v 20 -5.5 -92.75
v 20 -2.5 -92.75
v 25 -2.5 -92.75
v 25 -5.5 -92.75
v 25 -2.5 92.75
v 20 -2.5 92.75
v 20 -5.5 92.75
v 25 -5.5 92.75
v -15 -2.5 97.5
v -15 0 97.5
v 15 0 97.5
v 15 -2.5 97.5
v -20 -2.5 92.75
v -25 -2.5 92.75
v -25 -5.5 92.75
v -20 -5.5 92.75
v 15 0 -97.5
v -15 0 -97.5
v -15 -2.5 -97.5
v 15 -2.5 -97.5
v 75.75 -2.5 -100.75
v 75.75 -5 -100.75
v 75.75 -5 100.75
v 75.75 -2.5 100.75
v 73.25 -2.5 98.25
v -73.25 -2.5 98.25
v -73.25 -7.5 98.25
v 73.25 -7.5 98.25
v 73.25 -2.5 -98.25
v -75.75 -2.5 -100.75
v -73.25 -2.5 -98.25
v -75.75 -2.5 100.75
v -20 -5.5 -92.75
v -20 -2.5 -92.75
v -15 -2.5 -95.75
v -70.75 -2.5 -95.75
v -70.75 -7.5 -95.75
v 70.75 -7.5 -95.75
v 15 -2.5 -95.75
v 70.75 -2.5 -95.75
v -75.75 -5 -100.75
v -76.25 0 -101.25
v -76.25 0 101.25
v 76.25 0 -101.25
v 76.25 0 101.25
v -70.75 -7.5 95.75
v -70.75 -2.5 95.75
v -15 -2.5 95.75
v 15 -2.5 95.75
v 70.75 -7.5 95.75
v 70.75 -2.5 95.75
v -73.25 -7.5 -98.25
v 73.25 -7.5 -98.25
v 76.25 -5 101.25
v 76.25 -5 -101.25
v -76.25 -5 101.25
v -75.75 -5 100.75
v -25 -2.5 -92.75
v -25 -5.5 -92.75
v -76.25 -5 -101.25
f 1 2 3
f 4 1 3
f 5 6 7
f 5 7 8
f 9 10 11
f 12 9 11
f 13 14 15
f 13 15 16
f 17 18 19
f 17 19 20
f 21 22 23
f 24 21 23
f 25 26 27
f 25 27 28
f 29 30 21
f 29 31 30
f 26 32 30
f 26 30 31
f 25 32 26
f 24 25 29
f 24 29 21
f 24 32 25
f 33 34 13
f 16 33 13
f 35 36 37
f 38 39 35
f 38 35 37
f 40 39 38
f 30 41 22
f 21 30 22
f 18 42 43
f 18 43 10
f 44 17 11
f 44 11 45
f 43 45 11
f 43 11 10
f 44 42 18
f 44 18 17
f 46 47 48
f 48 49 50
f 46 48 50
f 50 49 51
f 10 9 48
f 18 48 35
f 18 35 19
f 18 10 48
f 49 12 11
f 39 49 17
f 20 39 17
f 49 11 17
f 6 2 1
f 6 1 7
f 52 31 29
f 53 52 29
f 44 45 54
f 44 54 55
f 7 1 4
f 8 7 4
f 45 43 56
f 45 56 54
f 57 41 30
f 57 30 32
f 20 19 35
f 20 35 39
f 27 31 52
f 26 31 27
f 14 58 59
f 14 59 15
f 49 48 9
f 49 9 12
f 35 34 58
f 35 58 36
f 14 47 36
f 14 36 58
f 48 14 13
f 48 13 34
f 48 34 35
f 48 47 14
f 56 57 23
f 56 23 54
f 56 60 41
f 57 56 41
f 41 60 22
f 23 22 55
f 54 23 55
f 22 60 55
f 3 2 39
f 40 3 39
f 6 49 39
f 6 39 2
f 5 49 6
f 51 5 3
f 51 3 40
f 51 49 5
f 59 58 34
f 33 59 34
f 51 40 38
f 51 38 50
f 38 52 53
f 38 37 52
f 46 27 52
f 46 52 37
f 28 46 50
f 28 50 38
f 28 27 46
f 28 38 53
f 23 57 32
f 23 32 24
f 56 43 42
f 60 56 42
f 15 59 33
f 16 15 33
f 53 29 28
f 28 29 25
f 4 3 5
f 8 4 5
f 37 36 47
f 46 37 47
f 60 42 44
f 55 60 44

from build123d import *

# Parameters (mm, degrees)
SKETCH1_W           = 152.5
SKETCH1_H           = 202.5
BOSS_EXTRUDE1_DEPTH = 5
SKETCH3_W           = 151.5
SKETCH3_H           = 201.5
CUT_EXTRUDE1_DEPTH  = 2.5
SKETCH5_W           = 146.5
SKETCH5_H           = 196.5
SKETCH5_W_2         = 141.5
SKETCH5_H_2         = 191.5
BOSS_EXTRUDE3_DEPTH = 5
SKETCH6_W           = 30
SKETCH6_H           = 195
CUT_EXTRUDE4_DEPTH  = 2.5
SKETCH7_W           = 5
SKETCH7_H           = 185.5
BOSS_EXTRUDE5_DEPTH = 3


with BuildPart() as part:
    # Sketch1 → Boss-Extrude1 (new body)
    with BuildSketch(Plane(origin=(0, 0, 0), x_dir=(1, 0, 0), z_dir=(0, 1, 0))):
        Rectangle(SKETCH1_W, SKETCH1_H)
    extrude(amount=-BOSS_EXTRUDE1_DEPTH)

    # Sketch3 → Cut-Extrude1 (cut)
    with BuildSketch(Plane.XZ.offset(5)):
        Rectangle(SKETCH3_W, SKETCH3_H)
    extrude(amount=-CUT_EXTRUDE1_DEPTH, mode=Mode.SUBTRACT)

    # Sketch5 → Boss-Extrude3 (add)
    with BuildSketch(Plane.XZ.offset(2.5)):
        Rectangle(SKETCH5_W, SKETCH5_H)
        Rectangle(SKETCH5_W_2, SKETCH5_H_2, mode=Mode.SUBTRACT)
    extrude(amount=BOSS_EXTRUDE3_DEPTH)

    # Sketch6 → Cut-Extrude4 (cut)
    with BuildSketch(Plane(origin=(0, 0, 0), x_dir=(1, 0, 0), z_dir=(0, 1, 0))):
        Rectangle(SKETCH6_W, SKETCH6_H)
    extrude(amount=-CUT_EXTRUDE4_DEPTH, mode=Mode.SUBTRACT)

    # Sketch7 → Boss-Extrude5 (add)
    with BuildSketch(Plane.XZ.offset(2.5)):
        with Locations((-22.5, 0)):
            Rectangle(SKETCH7_W, SKETCH7_H)
        with Locations((22.5, 0)):
            Rectangle(SKETCH7_W, SKETCH7_H)
    extrude(amount=BOSS_EXTRUDE5_DEPTH)


solid = part.part
